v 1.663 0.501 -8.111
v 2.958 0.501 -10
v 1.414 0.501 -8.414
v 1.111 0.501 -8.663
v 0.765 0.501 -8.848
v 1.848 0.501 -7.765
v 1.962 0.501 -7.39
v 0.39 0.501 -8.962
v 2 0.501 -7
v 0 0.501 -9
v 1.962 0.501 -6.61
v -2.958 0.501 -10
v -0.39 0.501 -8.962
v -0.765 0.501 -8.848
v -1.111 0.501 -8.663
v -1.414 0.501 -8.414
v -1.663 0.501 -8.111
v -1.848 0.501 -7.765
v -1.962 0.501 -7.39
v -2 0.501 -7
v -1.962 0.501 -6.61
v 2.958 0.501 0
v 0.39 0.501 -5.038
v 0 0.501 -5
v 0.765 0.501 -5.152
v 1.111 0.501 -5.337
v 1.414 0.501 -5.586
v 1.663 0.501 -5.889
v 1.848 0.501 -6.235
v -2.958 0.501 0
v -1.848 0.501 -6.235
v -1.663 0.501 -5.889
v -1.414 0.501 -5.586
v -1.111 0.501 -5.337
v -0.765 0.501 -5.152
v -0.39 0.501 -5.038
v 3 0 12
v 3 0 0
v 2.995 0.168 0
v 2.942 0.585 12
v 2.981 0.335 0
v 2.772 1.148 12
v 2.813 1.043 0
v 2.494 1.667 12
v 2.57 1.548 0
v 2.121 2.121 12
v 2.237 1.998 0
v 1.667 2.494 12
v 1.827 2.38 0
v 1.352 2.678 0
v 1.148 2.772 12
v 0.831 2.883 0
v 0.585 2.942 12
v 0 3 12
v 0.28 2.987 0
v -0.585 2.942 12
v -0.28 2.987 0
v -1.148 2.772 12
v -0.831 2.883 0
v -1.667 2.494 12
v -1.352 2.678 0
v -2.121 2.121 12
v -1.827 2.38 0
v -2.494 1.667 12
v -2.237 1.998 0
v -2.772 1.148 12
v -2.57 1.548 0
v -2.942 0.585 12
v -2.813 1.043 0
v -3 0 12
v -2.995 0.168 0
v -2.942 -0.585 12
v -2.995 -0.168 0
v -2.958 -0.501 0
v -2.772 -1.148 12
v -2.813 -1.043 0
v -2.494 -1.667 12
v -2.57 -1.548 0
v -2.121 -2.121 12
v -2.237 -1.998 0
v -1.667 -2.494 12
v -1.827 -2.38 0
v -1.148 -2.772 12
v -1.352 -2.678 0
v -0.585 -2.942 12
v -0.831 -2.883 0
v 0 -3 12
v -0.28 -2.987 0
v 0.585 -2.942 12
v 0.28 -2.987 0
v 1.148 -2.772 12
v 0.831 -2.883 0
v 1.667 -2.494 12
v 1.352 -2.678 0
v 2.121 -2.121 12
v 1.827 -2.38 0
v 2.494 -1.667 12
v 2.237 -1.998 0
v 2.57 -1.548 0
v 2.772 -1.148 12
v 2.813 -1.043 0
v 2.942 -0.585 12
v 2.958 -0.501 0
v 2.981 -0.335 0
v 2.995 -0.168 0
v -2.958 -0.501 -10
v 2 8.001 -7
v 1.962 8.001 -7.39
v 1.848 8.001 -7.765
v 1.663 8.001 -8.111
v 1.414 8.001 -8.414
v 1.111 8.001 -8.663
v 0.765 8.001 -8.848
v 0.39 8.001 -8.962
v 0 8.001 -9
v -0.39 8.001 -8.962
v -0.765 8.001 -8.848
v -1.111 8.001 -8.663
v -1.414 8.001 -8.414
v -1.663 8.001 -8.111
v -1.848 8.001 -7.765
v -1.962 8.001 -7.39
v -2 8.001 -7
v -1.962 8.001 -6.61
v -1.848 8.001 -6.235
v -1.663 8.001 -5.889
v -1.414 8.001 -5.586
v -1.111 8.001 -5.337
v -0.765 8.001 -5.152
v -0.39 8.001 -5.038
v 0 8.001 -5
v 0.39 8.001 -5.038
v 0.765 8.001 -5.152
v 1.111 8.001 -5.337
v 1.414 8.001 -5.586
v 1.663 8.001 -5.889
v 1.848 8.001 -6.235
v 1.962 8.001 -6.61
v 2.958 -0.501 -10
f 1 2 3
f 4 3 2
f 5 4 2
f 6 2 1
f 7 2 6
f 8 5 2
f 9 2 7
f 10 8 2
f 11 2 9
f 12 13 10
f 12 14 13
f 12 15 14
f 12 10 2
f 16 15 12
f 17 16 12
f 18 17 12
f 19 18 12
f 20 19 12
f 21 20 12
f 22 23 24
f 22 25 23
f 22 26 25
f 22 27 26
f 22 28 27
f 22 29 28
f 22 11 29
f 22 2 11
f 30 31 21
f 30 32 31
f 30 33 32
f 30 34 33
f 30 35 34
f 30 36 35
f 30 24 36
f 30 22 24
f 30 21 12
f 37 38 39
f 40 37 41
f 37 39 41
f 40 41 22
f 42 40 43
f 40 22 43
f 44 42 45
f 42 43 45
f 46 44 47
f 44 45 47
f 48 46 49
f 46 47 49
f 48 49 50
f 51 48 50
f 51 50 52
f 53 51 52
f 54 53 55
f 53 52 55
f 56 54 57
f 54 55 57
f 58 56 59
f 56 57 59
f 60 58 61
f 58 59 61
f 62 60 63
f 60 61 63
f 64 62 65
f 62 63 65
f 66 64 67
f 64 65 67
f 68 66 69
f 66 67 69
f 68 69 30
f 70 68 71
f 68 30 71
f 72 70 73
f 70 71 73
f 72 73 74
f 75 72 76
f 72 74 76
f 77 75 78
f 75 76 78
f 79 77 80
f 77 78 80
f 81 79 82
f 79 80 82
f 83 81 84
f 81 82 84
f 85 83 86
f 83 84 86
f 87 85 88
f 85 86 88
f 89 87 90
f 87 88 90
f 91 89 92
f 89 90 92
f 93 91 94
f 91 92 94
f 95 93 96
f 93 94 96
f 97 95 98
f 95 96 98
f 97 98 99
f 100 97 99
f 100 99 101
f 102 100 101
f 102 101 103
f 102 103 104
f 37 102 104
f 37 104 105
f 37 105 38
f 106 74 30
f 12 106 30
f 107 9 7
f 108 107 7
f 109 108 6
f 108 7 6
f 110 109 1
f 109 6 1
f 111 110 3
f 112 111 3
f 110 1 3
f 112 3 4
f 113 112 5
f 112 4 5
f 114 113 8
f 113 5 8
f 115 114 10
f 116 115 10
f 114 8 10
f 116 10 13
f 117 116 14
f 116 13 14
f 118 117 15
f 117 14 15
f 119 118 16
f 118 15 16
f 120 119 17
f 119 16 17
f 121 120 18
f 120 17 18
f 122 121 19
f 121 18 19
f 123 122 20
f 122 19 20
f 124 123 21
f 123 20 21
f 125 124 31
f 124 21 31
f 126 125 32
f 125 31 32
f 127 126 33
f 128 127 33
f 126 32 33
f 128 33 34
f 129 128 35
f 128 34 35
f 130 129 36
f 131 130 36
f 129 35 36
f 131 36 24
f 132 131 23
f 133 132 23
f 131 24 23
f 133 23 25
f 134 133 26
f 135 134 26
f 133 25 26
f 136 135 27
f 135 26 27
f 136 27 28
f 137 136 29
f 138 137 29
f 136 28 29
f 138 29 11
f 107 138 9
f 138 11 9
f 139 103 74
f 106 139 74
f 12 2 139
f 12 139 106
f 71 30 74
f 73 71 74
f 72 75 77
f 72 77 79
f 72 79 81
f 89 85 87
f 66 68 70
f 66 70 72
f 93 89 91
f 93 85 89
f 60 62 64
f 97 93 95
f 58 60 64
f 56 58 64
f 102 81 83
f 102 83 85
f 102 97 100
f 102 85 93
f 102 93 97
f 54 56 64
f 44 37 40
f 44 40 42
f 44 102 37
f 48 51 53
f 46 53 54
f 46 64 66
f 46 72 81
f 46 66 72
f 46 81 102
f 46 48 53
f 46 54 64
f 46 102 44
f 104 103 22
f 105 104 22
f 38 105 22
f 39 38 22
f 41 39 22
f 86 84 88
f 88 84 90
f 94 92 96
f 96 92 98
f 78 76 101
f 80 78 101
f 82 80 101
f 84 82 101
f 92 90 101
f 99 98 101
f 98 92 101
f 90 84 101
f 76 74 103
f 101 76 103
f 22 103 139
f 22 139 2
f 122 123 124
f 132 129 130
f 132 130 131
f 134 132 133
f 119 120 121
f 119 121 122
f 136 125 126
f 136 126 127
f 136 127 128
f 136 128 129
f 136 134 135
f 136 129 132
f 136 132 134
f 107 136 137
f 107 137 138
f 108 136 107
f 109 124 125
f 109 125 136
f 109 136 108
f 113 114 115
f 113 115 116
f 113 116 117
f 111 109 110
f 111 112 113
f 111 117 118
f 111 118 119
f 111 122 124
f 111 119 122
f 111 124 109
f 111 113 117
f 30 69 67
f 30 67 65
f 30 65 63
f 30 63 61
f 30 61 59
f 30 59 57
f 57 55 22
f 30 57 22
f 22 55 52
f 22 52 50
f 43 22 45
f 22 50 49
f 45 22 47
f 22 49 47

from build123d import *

# Parameters (mm, degrees)
SKETCH1_R           = 3
BOSS_EXTRUDE1_DEPTH = 12
SKETCH2_W           = 5.91565448
SKETCH2_H           = 1.002512874
BOSS_EXTRUDE2_DEPTH = 10
SKETCH4_R           = 2
BOSS_EXTRUDE3_DEPTH = 7.5


with BuildPart() as part:
    # Sketch1 → Boss-Extrude1 (new body)
    with BuildSketch(Plane.XY):
        Circle(SKETCH1_R)
    extrude(amount=BOSS_EXTRUDE1_DEPTH)

    # Sketch2 → Boss-Extrude2 (add)
    with BuildSketch(Plane(origin=(0, 0, 0), x_dir=(-1, 0, 0), z_dir=(0, 0, -1))):
        Rectangle(SKETCH2_W, SKETCH2_H)
    extrude(amount=BOSS_EXTRUDE2_DEPTH)

    # Sketch4 → Boss-Extrude3 (add)
    with BuildSketch(Plane(origin=(0, 0.501256437, 0), x_dir=(1, 0, 0), z_dir=(0, 1, 0))):
        with Locations((0, 7)):
            Circle(SKETCH4_R)
    extrude(amount=BOSS_EXTRUDE3_DEPTH)


solid = part.part
